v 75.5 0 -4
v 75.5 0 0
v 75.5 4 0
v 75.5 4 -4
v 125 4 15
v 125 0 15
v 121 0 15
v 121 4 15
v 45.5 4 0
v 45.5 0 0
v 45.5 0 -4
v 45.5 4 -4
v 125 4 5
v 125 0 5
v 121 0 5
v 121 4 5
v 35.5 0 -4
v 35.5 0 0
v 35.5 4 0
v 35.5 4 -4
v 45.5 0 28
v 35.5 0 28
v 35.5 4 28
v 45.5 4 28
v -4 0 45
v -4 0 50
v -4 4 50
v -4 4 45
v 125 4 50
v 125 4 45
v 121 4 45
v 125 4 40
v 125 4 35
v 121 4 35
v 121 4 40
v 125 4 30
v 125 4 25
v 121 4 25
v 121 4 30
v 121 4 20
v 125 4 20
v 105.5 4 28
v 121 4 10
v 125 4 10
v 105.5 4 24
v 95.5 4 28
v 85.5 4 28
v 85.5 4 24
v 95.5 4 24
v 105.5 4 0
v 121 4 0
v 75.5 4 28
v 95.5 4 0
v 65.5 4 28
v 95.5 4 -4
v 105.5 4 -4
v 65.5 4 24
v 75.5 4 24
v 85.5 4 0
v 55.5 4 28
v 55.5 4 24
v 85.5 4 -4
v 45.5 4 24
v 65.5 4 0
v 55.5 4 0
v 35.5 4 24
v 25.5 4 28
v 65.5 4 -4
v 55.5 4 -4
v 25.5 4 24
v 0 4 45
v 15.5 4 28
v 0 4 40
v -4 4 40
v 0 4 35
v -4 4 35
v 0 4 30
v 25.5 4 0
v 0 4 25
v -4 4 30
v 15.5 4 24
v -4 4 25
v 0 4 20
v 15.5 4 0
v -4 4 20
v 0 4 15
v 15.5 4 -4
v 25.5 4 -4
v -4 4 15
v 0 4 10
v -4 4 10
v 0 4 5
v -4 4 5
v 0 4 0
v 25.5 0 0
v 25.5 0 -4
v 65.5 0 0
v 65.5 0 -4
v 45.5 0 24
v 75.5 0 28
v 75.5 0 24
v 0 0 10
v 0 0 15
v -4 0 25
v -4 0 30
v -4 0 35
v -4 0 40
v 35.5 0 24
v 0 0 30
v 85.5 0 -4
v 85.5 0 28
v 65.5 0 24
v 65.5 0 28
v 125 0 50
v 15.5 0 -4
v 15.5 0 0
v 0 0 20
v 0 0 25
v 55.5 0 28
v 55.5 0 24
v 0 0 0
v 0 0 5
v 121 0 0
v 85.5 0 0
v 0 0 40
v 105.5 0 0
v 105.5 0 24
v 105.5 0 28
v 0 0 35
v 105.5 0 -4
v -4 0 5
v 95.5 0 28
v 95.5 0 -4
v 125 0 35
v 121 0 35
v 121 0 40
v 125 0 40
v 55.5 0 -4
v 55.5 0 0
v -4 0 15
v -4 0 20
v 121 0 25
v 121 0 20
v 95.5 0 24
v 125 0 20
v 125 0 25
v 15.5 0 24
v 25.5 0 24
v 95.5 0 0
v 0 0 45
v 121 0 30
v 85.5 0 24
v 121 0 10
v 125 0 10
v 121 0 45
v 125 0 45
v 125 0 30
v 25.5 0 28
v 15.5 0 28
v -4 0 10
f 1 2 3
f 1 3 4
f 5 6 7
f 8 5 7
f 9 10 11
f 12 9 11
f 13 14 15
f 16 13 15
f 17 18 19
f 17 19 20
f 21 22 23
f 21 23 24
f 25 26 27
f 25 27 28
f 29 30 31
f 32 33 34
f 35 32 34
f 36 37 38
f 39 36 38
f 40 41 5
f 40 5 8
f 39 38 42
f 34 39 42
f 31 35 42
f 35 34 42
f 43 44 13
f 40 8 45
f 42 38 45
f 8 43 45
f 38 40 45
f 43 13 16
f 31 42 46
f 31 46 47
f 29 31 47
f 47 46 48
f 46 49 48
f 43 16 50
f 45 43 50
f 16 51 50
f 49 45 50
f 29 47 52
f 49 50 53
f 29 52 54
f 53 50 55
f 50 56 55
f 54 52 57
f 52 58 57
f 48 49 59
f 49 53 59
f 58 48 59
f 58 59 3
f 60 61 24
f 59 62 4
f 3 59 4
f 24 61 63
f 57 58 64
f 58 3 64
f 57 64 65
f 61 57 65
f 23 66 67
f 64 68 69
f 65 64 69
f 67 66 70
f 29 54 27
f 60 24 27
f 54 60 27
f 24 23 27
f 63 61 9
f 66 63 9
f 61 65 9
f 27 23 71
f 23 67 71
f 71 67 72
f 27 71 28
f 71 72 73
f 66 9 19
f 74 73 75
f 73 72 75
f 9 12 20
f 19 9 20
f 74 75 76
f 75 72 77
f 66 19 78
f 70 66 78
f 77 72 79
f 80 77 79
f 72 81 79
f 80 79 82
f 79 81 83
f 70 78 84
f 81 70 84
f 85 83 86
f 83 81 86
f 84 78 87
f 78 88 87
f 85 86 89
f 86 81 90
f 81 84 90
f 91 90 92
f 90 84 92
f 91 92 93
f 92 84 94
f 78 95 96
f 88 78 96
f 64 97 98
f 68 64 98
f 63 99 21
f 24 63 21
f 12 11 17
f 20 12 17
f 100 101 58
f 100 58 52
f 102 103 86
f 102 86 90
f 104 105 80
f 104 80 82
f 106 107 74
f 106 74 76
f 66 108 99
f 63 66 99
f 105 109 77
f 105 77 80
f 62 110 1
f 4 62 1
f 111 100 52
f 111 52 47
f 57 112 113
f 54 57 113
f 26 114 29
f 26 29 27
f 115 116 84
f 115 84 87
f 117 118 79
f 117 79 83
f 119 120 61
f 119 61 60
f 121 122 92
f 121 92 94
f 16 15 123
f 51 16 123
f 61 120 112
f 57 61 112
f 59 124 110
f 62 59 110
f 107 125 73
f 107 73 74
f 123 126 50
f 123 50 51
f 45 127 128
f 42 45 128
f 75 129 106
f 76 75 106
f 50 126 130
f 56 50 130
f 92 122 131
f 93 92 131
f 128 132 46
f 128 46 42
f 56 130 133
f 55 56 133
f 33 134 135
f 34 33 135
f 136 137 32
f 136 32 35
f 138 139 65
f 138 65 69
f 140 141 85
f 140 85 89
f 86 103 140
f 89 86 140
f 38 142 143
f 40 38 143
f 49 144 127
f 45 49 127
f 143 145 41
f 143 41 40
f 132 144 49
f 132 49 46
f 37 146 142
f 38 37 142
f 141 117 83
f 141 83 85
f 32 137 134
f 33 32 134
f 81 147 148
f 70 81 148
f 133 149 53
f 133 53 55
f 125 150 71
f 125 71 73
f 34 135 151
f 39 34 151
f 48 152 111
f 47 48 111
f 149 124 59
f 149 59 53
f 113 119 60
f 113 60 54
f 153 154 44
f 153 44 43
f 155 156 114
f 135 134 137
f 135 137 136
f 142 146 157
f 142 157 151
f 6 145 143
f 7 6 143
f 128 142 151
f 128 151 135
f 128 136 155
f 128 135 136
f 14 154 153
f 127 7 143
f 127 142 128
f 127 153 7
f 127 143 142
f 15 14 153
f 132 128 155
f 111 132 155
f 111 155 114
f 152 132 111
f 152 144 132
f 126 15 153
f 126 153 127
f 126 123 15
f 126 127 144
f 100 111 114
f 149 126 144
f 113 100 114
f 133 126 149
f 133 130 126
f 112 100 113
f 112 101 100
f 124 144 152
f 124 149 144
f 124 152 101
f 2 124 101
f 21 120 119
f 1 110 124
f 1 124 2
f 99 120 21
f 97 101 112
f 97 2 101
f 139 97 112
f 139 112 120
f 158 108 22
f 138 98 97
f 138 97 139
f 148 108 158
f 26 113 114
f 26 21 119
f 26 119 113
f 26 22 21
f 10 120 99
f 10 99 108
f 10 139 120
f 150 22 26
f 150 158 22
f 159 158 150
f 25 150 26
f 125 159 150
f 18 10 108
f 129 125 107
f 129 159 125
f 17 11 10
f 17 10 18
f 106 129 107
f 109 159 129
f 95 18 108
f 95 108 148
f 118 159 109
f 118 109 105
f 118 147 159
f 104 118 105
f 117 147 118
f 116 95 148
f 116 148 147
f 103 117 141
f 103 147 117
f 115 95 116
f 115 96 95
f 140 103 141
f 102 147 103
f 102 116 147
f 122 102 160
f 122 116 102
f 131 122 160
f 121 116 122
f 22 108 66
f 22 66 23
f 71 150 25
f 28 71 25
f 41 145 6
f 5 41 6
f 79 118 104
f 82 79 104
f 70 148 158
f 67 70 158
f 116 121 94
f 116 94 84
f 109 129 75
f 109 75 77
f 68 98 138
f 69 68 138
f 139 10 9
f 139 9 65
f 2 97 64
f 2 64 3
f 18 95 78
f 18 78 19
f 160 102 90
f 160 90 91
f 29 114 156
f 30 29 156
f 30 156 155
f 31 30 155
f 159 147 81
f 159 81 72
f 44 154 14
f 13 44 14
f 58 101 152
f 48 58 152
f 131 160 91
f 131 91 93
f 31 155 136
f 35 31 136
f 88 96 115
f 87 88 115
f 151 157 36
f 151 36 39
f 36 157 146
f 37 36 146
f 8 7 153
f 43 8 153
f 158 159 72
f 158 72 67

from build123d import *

# Parameters (mm, degrees)
SKETCH1_W           = 121
SKETCH1_H           = 50
BOSS_EXTRUDE1_DEPTH = 4
SKETCH2_W           = 4
SKETCH2_H           = 5
BOSS_EXTRUDE2_DEPTH = 4
LPATTERN1_COUNT     = 5
LPATTERN1_PITCH     = 10
SKETCH3_W           = 10
SKETCH3_H           = 4
BOSS_EXTRUDE3_DEPTH = 4
LPATTERN2_COUNT     = 3
LPATTERN2_PITCH     = 20
LPATTERN2_COL_COUNT = 3
LPATTERN2_COL_PITCH = 20
SKETCH4_W           = 10
SKETCH4_H           = 4
CUT_EXTRUDE1_DEPTH  = 135.688529578


with BuildPart() as part:
    # Sketch1 → Boss-Extrude1 (new body)
    with BuildSketch(Plane(origin=(0, 0, 0), x_dir=(1, 0, 0), z_dir=(0, 1, 0))):
        with Locations((60.5, -25)):
            Rectangle(SKETCH1_W, SKETCH1_H)
    extrude(amount=BOSS_EXTRUDE1_DEPTH)

    # Sketch2 → Boss-Extrude2 (add, through all)
    with BuildSketch(Plane(origin=(0, 0, 0), x_dir=(-1, 0, 0), z_dir=(0, -1, 0))):
        with Locations((2, -47.5)):
            Rectangle(SKETCH2_W, SKETCH2_H)
        with Locations((-123, -47.5)):
            Rectangle(SKETCH2_W, SKETCH2_H)
    boss_extrude2 = extrude(amount=-BOSS_EXTRUDE2_DEPTH)

    # LPattern1: Boss-Extrude2 ×5
    with Locations(*[(0, 0, -i * LPATTERN1_PITCH) for i in range(1, LPATTERN1_COUNT)]):
        add(boss_extrude2)

    # Sketch3 → Boss-Extrude3 (add, through all)
    with BuildSketch(Plane(origin=(0, 0, 0), x_dir=(-1, 0, 0), z_dir=(0, -1, 0))):
        with Locations((-60.5, 2)):
            Rectangle(SKETCH3_W, SKETCH3_H)
    boss_extrude3 = extrude(amount=-BOSS_EXTRUDE3_DEPTH)

    # LPattern2: Boss-Extrude3 ×3
    with Locations(*[(i * LPATTERN2_PITCH, 0, 0) for i in range(1, LPATTERN2_COUNT)]):
        add(boss_extrude3)

    # LPattern2 col: Boss-Extrude3 ×3
    with Locations(*[(-i * LPATTERN2_COL_PITCH, 0, 0) for i in range(1, LPATTERN2_COL_COUNT)]):
        add(boss_extrude3)

    # Sketch4 → Cut-Extrude1 (cut, through all)
    with BuildSketch(Plane.XZ):
        with Locations((20.5, 26)):
            Rectangle(SKETCH4_W, SKETCH4_H)
        with Locations((40.5, 26)):
            Rectangle(SKETCH4_W, SKETCH4_H)
        with Locations((60.5, 26)):
            Rectangle(SKETCH4_W, SKETCH4_H)
        with Locations((80.5, 26)):
            Rectangle(SKETCH4_W, SKETCH4_H)
        with Locations((100.5, 26)):
            Rectangle(SKETCH4_W, SKETCH4_H)
    extrude(amount=-CUT_EXTRUDE1_DEPTH, mode=Mode.SUBTRACT)


solid = part.part
